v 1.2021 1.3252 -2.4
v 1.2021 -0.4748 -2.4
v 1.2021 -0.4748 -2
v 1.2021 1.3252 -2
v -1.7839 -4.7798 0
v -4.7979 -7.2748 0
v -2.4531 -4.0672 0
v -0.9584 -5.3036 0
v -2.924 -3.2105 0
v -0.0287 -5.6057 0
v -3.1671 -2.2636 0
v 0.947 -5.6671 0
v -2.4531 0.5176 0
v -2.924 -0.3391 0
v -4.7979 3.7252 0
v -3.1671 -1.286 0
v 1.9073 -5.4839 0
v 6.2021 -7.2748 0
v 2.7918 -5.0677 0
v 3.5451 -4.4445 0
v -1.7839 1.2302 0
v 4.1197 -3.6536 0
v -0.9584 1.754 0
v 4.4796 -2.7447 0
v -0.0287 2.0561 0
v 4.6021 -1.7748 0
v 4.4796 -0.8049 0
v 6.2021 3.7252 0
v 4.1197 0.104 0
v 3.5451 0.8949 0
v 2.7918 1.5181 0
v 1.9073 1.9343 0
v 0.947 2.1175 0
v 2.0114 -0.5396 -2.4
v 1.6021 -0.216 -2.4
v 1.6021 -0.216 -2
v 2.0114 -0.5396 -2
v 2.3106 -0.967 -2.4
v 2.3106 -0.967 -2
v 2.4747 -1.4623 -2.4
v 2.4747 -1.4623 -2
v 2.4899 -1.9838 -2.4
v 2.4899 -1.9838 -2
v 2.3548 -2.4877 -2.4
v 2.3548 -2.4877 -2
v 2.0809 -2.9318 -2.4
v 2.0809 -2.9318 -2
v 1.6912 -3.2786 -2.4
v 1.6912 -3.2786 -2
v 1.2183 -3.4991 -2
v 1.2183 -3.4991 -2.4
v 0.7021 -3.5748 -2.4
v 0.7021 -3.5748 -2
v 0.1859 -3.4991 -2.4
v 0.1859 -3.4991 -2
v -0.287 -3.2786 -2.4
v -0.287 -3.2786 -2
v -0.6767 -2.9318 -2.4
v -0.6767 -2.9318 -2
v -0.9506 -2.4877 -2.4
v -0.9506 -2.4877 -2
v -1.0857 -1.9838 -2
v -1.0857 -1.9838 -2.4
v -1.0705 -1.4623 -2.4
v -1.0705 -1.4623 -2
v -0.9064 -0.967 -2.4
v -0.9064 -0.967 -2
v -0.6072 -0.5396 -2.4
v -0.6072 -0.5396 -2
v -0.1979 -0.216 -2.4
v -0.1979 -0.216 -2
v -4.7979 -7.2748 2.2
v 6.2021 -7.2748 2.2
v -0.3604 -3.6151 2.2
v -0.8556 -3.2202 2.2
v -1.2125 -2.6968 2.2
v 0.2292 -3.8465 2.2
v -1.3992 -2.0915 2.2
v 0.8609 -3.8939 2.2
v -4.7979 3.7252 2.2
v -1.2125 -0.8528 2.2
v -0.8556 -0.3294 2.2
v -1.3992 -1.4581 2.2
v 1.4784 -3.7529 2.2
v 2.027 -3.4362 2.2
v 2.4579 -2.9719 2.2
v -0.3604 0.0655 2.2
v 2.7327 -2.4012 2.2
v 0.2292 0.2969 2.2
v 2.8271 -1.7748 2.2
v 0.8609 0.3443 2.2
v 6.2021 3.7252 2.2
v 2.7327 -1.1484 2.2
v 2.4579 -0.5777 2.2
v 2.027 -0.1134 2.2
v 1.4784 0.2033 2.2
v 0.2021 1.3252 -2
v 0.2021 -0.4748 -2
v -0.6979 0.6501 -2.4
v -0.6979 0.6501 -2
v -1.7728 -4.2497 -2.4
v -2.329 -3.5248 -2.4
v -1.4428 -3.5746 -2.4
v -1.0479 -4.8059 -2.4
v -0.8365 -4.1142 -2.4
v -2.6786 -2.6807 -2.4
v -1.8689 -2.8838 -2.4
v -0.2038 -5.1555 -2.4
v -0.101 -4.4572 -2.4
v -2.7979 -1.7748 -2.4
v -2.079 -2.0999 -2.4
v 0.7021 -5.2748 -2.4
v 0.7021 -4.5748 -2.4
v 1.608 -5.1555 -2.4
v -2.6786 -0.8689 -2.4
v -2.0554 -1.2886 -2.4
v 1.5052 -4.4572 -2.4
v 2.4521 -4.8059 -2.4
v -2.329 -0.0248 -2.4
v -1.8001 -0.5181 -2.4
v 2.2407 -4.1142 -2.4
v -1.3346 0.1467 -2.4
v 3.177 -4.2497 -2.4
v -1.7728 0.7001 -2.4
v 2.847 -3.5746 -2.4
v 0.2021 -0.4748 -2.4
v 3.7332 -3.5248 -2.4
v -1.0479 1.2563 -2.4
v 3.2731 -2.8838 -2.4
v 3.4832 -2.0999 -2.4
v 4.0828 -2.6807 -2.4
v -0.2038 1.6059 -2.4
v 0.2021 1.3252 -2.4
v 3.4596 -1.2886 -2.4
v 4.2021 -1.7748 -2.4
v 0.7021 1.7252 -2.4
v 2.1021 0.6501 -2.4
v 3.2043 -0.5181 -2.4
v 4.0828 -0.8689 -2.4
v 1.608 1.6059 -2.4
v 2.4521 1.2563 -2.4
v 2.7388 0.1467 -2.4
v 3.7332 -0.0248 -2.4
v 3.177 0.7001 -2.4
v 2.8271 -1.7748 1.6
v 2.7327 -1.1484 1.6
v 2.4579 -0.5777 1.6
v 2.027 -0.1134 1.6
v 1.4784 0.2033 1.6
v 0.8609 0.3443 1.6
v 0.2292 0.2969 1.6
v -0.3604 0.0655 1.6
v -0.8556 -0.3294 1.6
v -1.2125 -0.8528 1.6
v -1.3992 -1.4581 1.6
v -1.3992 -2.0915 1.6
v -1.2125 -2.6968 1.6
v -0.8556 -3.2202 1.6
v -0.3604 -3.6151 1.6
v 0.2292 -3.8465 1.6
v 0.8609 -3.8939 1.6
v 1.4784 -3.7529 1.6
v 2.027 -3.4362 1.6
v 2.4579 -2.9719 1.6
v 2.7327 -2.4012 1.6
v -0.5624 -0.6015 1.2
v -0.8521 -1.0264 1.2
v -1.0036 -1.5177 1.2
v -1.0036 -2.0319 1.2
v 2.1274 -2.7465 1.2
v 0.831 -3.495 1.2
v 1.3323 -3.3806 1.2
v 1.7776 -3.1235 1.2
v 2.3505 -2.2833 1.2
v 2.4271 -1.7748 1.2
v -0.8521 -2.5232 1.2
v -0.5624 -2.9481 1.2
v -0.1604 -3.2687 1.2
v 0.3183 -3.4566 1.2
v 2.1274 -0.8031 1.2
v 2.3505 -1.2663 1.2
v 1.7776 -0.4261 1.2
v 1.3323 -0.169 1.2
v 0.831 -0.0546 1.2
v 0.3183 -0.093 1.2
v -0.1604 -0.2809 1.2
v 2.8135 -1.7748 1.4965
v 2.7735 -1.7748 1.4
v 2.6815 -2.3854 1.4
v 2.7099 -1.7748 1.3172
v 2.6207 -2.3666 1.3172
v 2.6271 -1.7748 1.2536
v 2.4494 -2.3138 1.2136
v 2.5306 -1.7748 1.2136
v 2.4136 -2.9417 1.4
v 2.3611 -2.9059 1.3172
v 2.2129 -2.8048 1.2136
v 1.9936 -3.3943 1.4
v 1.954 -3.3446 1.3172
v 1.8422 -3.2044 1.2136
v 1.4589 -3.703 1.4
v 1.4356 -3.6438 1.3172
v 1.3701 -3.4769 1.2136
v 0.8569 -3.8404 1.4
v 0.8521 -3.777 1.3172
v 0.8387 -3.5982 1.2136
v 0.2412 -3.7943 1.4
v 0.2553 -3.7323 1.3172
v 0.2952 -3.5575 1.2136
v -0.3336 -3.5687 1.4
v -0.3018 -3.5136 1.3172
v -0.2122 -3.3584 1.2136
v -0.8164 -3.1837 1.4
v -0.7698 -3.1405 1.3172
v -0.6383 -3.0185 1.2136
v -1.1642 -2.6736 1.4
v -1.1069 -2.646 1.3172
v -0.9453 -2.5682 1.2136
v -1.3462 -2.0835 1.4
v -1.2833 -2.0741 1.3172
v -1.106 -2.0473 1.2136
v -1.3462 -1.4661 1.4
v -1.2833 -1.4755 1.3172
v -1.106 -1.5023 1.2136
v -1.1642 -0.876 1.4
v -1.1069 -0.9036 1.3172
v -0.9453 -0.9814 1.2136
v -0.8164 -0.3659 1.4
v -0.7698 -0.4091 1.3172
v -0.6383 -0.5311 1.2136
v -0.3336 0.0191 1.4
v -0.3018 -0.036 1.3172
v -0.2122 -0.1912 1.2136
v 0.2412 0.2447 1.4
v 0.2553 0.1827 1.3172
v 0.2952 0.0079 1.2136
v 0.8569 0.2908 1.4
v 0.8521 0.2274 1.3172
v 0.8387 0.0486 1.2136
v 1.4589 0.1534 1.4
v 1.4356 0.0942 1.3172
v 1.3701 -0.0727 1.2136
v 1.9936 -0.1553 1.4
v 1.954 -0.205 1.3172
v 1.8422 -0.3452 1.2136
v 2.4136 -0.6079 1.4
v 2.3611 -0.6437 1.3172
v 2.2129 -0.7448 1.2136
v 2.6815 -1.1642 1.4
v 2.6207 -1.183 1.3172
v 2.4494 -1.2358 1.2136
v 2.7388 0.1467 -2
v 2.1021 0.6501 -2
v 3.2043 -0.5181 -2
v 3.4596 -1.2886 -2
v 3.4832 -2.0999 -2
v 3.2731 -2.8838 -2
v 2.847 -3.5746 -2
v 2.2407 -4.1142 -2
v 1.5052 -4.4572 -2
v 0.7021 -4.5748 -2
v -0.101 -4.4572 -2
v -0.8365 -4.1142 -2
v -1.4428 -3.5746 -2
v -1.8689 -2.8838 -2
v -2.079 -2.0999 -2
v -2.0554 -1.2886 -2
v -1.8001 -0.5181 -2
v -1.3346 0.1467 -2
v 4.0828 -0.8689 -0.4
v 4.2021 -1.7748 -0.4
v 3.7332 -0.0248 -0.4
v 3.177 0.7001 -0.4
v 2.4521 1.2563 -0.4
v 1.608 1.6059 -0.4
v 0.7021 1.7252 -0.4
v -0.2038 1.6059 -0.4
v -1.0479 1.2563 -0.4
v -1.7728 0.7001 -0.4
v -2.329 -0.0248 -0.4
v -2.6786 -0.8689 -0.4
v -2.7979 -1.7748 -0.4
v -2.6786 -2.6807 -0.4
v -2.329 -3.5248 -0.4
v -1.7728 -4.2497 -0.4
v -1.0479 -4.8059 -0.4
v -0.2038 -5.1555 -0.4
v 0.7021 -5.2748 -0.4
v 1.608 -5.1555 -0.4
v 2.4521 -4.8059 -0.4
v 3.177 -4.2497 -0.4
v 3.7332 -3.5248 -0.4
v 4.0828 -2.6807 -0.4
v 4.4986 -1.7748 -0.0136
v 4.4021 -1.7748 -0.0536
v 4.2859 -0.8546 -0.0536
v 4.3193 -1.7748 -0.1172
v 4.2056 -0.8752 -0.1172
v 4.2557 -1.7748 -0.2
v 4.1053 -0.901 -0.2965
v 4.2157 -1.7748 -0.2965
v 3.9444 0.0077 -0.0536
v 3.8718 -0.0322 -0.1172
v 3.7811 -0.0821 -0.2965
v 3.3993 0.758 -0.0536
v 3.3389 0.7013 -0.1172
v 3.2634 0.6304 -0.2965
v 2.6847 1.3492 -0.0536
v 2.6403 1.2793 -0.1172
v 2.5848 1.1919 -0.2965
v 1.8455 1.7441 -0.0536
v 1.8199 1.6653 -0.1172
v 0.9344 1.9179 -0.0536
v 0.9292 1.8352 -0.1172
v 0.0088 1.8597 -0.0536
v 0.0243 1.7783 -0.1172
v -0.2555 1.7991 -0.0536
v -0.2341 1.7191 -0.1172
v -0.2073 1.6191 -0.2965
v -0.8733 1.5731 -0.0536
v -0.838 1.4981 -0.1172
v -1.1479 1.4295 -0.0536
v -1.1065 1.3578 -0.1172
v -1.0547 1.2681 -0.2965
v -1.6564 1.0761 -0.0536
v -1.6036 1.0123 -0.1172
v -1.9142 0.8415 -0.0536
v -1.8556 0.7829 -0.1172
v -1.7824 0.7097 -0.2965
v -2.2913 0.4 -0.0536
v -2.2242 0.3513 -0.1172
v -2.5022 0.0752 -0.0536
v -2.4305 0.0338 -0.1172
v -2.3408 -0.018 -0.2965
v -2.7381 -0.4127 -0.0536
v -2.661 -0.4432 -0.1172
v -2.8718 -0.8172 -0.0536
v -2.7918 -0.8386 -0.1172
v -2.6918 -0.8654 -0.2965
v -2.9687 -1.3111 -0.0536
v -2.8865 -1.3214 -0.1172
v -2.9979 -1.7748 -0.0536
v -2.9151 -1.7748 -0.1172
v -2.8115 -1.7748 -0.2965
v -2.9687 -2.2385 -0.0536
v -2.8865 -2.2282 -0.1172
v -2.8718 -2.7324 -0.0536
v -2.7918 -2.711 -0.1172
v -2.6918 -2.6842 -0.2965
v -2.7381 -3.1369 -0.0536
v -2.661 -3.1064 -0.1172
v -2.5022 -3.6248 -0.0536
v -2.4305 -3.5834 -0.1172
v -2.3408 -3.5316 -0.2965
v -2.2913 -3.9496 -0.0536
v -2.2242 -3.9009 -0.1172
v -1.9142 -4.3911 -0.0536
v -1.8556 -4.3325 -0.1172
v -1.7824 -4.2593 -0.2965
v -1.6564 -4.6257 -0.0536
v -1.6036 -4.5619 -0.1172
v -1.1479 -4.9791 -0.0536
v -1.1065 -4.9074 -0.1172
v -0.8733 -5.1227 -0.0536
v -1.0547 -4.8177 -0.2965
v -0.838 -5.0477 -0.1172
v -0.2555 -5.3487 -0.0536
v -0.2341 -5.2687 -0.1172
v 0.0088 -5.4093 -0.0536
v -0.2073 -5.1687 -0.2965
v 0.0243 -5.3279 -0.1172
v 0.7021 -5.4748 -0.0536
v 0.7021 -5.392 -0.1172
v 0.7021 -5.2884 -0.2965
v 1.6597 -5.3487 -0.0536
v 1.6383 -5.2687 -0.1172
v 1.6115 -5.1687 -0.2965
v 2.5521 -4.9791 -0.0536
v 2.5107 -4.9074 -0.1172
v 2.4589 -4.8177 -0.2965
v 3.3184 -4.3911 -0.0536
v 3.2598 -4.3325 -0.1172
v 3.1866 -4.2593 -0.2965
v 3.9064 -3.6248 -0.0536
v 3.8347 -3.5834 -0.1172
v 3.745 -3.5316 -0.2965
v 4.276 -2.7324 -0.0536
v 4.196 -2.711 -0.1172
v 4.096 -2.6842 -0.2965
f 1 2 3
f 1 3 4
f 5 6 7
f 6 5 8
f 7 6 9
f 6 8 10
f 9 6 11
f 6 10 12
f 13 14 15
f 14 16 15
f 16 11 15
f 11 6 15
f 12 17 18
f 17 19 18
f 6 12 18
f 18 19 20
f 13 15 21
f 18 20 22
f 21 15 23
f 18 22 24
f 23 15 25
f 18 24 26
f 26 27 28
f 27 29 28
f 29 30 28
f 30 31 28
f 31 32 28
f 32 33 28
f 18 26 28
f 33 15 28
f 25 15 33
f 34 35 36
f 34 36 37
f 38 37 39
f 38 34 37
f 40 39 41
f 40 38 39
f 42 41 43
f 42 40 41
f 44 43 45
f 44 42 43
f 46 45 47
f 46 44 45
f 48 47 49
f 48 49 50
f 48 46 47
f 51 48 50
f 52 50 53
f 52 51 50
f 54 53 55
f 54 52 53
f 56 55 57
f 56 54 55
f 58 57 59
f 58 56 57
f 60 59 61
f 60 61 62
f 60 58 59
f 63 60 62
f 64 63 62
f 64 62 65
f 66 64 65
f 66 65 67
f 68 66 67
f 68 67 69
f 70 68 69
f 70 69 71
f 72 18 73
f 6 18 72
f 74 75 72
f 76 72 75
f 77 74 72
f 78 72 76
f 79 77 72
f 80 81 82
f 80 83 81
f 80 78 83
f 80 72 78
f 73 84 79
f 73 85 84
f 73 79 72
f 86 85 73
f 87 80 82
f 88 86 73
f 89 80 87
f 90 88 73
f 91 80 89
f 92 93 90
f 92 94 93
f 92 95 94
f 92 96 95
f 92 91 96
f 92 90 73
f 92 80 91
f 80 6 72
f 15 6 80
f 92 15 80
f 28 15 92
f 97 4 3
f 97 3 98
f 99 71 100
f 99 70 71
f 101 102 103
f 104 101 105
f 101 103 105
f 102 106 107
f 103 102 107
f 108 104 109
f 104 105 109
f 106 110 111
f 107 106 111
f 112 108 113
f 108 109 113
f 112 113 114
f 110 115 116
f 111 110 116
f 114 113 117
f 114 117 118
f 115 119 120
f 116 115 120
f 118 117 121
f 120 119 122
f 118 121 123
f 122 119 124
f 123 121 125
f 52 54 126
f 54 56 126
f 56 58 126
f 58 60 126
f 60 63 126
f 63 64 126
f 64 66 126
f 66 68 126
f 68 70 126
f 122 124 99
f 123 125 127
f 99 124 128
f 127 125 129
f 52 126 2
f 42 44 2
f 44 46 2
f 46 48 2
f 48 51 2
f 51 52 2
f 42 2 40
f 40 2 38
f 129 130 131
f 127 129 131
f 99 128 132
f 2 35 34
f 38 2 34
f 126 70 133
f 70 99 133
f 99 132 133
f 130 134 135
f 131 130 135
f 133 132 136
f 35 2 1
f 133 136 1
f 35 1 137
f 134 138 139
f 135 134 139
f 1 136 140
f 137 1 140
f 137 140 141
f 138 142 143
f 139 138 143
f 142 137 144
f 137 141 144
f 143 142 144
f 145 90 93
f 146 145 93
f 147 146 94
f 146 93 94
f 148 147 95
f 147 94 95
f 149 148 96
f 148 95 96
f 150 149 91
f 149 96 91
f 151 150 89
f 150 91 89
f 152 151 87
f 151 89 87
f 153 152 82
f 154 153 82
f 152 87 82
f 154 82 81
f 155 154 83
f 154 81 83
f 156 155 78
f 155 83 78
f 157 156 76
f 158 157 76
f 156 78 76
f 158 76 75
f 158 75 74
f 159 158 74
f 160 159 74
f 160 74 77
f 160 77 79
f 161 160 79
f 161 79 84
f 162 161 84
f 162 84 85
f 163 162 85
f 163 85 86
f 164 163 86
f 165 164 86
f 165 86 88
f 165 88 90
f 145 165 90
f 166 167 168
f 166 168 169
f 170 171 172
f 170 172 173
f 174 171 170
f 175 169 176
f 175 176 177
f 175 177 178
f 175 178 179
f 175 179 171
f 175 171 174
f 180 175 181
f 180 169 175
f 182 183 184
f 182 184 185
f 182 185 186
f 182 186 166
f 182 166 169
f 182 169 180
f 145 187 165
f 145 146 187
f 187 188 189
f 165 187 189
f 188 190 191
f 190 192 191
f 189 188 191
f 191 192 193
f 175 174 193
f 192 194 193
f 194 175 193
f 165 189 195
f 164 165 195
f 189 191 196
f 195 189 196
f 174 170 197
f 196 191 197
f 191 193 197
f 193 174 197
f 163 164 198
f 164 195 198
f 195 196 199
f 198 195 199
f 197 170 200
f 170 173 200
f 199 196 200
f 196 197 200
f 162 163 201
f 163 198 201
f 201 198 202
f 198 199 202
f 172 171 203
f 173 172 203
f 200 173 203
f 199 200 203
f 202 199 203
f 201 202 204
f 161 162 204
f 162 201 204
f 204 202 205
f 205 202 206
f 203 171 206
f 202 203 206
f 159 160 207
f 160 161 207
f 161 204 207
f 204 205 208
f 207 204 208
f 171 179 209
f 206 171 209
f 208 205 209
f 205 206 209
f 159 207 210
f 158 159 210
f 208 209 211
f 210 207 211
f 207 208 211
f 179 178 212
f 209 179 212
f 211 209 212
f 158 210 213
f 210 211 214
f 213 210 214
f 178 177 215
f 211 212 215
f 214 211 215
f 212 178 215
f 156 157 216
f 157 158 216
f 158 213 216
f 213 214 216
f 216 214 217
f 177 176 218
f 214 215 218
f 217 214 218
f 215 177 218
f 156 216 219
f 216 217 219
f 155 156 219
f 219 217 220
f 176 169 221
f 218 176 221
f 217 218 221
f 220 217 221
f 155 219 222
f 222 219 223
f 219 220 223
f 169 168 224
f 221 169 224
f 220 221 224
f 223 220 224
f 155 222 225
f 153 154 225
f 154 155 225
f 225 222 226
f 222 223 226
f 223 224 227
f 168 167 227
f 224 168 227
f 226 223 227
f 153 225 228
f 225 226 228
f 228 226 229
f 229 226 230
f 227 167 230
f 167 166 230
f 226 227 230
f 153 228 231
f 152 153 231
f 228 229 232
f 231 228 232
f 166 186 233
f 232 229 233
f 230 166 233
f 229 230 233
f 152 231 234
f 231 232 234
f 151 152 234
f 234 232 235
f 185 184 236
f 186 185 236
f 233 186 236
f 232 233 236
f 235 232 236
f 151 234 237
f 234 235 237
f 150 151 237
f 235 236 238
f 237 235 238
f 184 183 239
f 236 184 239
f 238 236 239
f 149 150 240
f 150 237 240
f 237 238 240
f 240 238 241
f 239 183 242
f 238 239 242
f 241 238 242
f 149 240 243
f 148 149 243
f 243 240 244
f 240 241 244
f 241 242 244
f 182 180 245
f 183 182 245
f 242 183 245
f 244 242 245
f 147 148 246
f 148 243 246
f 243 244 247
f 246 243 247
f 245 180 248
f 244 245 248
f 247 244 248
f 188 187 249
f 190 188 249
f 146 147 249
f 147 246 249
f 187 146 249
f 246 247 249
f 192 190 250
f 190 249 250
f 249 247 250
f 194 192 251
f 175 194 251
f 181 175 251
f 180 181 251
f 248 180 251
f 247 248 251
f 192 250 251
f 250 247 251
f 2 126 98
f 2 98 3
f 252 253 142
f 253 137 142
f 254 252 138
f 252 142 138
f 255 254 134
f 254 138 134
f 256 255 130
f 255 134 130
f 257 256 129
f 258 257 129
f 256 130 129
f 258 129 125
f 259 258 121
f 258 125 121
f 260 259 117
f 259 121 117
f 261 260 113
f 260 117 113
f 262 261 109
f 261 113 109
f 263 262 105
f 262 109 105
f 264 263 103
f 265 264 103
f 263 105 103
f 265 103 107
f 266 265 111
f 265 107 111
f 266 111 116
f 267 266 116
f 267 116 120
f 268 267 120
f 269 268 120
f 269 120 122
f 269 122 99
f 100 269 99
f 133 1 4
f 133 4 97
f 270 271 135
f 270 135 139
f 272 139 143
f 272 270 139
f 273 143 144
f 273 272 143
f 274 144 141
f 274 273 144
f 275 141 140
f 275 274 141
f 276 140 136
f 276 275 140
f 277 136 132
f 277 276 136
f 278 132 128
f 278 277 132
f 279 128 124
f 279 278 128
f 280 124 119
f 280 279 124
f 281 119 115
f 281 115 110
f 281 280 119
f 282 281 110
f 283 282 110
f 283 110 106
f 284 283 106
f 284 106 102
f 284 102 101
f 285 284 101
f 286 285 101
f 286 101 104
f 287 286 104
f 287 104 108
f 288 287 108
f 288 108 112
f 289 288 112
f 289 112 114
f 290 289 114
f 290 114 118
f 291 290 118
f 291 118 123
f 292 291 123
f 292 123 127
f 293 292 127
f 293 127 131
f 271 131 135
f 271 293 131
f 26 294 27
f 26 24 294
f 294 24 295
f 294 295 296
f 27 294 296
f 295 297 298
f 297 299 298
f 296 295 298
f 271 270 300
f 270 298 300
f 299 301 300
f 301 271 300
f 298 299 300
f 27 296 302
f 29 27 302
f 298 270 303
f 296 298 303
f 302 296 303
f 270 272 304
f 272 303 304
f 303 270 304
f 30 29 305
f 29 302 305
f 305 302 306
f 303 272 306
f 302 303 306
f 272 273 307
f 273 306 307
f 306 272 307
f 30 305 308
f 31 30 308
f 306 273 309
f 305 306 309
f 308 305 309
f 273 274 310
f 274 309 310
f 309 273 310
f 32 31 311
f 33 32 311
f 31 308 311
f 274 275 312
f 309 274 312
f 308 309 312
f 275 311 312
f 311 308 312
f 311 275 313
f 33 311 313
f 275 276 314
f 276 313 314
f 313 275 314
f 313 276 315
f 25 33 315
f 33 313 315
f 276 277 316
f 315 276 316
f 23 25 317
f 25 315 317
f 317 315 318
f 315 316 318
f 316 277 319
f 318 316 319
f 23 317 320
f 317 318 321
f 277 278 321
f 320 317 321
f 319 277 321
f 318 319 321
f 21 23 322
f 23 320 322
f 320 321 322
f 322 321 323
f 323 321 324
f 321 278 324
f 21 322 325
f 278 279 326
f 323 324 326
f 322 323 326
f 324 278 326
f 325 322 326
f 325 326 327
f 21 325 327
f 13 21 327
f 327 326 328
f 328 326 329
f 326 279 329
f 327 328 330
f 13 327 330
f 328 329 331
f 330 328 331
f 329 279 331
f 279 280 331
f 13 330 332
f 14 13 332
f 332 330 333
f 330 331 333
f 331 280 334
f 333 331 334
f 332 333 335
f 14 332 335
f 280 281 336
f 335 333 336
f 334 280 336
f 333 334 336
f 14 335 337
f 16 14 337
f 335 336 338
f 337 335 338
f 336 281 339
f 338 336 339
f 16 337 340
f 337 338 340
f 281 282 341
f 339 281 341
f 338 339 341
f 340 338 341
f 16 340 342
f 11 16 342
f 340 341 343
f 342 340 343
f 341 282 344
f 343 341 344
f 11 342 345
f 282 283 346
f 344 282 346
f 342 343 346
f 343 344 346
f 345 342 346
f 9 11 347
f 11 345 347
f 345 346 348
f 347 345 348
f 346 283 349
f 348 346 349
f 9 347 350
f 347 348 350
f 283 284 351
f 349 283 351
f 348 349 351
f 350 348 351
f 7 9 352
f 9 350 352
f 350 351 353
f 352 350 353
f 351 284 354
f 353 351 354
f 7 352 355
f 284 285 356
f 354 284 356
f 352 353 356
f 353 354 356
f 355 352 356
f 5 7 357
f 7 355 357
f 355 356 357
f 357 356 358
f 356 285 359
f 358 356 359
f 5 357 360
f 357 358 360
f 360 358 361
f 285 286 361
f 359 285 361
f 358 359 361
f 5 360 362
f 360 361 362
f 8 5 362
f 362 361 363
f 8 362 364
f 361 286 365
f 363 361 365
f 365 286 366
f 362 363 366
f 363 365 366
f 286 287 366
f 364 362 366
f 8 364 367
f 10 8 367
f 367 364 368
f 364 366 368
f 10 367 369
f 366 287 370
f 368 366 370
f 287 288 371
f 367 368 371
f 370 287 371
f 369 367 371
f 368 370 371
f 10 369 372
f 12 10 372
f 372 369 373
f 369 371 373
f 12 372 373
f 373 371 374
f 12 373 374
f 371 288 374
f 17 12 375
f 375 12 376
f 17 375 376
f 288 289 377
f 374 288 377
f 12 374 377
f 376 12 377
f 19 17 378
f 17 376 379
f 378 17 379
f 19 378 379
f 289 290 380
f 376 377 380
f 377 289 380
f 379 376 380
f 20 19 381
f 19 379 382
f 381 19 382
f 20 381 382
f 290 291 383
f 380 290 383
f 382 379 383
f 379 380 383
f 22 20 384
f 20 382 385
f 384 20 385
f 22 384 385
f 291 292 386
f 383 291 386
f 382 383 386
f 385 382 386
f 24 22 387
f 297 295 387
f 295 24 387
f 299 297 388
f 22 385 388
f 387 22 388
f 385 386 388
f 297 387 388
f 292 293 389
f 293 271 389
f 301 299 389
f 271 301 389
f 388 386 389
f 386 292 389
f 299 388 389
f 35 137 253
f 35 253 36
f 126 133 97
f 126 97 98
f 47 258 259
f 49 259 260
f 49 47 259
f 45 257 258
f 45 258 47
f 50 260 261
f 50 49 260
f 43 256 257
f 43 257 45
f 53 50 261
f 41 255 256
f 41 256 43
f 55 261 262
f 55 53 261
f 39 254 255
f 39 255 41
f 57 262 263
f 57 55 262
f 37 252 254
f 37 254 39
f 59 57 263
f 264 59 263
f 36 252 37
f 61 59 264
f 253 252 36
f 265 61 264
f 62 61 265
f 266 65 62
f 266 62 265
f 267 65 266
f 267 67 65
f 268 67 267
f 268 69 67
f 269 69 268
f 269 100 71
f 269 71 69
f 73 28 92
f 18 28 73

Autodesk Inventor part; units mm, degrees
ref_plane "YZ Plane" through (0, 0, 0) normal (1, 0, 0) x (0, 1, 0)
ref_plane "XZ Plane" through (0, 0, 0) normal (0, 1, 0) x (-1, 0, 0)
ref_plane "XY Plane" through (0, 0, 0) normal (0, 0, 1) x (1, 0, 0)
sketch "Sketch1" plane through (0, 0, 0) normal (0, 0, 1) x (1, 0, 0)
  line L0 (-4.7979, 3.7252) -> (6.2021, 3.7252)
  line L1 (6.2021, 3.7252) -> (6.2021, -7.2748)
  line L2 (6.2021, -7.2748) -> (-4.7979, -7.2748)
  line L3 (-4.7979, -7.2748) -> (-4.7979, 3.7252)
  circle A0 centre (0.7021, -1.7748) radius 3.5
  point P0 (0, 0)
  dimension "d0" = 11
  dimension "d1" = 11
  dimension "d2" = 7
extrude "Base" add sketch "Sketch1" along normal blind 2.2 contours L0 L1 L2 L3 | A0
extrude "Button" add sketch "Sketch1" against normal blind 2.4 contours A0
sketch "Sketch2" plane through (0, 0, 2.2) normal (0, 0, 1) x (1, 0, 0)
  circle A0 centre (0.7021, -1.7748) radius 2.125
  line L0 (6.2021, 3.7252) -> (-4.7979, 3.7252) projected
  line L1 (-4.7979, 3.7252) -> (-4.7979, -7.2748) projected
  point P0 (0, 0)
  dimension "d7" = 4.25
  dimension "d8" = 5.5
  dimension "d9" = 5.5
extrude "Tact switch button cutout" cut sketch "Sketch2" against normal blind 1
fillet "Cutout fillet" radius 0.4 1 edges at (-1.4229, -1.7748, 1.2)
fillet "Fillet2" radius 0.4 1 edges at (-2.7979, -1.7748, 0)
sketch "Sketch3" plane through (0.7021, -1.7748, -2.4) normal (0, 0, -1) x (-1, 0, 0)
  arc A0 (-1.4, 2.4249) -> (1.4, 2.4249) centre (0, 0) ccw
  line L0 (0, 0) -> (-1.4, 2.4249) construction
  line L1 (0, 0) -> (1.4, 2.4249) construction
  arc A1 (-0.9, 1.5588) -> (0.9, 1.5588) centre (0, 0) ccw
  line L2 (0, 0) -> (-0.9, 1.5588) construction
  line L3 (0, 0) -> (0.9, 1.5588) construction
  line L4 (-5.5, 5.5) -> (-5.5, -5.5) projected
  line L5 (5.5, 5.5) -> (-5.5, 5.5) projected
  line L6 (-1.4, 2.4249) -> (-0.9, 1.5588)
  line L7 (0.9, 1.5588) -> (1.4, 2.4249)
  line L8 (5.5, -5.5) -> (5.5, 5.5) projected
  line L9 (-0.5, 3.1) -> (0.5, 3.1)
  line L10 (0.5, 3.1) -> (0.5, 1.3)
  line L11 (0.5, 1.3) -> (-0.5, 1.3)
  line L12 (-0.5, 1.3) -> (-0.5, 3.1)
  point P0 (0.7021, 1.7748)
  dimension "d17" = 2.8
  dimension "d18" = 60
  dimension "d19" = 1.8
  dimension "d20" = 60
  dimension "d21" = 5.5
  dimension "d22" = 5.5
  dimension "d23" = 30
  dimension "d24" = 1
  dimension "d25" = 0.5
  dimension "d26" = 1.8
  dimension "d27" = 1.3
extrude "Power symbol" cut sketch "Sketch3" against normal blind 0.4
equation "\"d18\" = d20"
equation "\"d23\" = 0.5 * d20"
equation "\"d25\" = 0.5 * d24"
properties part number "power button"
